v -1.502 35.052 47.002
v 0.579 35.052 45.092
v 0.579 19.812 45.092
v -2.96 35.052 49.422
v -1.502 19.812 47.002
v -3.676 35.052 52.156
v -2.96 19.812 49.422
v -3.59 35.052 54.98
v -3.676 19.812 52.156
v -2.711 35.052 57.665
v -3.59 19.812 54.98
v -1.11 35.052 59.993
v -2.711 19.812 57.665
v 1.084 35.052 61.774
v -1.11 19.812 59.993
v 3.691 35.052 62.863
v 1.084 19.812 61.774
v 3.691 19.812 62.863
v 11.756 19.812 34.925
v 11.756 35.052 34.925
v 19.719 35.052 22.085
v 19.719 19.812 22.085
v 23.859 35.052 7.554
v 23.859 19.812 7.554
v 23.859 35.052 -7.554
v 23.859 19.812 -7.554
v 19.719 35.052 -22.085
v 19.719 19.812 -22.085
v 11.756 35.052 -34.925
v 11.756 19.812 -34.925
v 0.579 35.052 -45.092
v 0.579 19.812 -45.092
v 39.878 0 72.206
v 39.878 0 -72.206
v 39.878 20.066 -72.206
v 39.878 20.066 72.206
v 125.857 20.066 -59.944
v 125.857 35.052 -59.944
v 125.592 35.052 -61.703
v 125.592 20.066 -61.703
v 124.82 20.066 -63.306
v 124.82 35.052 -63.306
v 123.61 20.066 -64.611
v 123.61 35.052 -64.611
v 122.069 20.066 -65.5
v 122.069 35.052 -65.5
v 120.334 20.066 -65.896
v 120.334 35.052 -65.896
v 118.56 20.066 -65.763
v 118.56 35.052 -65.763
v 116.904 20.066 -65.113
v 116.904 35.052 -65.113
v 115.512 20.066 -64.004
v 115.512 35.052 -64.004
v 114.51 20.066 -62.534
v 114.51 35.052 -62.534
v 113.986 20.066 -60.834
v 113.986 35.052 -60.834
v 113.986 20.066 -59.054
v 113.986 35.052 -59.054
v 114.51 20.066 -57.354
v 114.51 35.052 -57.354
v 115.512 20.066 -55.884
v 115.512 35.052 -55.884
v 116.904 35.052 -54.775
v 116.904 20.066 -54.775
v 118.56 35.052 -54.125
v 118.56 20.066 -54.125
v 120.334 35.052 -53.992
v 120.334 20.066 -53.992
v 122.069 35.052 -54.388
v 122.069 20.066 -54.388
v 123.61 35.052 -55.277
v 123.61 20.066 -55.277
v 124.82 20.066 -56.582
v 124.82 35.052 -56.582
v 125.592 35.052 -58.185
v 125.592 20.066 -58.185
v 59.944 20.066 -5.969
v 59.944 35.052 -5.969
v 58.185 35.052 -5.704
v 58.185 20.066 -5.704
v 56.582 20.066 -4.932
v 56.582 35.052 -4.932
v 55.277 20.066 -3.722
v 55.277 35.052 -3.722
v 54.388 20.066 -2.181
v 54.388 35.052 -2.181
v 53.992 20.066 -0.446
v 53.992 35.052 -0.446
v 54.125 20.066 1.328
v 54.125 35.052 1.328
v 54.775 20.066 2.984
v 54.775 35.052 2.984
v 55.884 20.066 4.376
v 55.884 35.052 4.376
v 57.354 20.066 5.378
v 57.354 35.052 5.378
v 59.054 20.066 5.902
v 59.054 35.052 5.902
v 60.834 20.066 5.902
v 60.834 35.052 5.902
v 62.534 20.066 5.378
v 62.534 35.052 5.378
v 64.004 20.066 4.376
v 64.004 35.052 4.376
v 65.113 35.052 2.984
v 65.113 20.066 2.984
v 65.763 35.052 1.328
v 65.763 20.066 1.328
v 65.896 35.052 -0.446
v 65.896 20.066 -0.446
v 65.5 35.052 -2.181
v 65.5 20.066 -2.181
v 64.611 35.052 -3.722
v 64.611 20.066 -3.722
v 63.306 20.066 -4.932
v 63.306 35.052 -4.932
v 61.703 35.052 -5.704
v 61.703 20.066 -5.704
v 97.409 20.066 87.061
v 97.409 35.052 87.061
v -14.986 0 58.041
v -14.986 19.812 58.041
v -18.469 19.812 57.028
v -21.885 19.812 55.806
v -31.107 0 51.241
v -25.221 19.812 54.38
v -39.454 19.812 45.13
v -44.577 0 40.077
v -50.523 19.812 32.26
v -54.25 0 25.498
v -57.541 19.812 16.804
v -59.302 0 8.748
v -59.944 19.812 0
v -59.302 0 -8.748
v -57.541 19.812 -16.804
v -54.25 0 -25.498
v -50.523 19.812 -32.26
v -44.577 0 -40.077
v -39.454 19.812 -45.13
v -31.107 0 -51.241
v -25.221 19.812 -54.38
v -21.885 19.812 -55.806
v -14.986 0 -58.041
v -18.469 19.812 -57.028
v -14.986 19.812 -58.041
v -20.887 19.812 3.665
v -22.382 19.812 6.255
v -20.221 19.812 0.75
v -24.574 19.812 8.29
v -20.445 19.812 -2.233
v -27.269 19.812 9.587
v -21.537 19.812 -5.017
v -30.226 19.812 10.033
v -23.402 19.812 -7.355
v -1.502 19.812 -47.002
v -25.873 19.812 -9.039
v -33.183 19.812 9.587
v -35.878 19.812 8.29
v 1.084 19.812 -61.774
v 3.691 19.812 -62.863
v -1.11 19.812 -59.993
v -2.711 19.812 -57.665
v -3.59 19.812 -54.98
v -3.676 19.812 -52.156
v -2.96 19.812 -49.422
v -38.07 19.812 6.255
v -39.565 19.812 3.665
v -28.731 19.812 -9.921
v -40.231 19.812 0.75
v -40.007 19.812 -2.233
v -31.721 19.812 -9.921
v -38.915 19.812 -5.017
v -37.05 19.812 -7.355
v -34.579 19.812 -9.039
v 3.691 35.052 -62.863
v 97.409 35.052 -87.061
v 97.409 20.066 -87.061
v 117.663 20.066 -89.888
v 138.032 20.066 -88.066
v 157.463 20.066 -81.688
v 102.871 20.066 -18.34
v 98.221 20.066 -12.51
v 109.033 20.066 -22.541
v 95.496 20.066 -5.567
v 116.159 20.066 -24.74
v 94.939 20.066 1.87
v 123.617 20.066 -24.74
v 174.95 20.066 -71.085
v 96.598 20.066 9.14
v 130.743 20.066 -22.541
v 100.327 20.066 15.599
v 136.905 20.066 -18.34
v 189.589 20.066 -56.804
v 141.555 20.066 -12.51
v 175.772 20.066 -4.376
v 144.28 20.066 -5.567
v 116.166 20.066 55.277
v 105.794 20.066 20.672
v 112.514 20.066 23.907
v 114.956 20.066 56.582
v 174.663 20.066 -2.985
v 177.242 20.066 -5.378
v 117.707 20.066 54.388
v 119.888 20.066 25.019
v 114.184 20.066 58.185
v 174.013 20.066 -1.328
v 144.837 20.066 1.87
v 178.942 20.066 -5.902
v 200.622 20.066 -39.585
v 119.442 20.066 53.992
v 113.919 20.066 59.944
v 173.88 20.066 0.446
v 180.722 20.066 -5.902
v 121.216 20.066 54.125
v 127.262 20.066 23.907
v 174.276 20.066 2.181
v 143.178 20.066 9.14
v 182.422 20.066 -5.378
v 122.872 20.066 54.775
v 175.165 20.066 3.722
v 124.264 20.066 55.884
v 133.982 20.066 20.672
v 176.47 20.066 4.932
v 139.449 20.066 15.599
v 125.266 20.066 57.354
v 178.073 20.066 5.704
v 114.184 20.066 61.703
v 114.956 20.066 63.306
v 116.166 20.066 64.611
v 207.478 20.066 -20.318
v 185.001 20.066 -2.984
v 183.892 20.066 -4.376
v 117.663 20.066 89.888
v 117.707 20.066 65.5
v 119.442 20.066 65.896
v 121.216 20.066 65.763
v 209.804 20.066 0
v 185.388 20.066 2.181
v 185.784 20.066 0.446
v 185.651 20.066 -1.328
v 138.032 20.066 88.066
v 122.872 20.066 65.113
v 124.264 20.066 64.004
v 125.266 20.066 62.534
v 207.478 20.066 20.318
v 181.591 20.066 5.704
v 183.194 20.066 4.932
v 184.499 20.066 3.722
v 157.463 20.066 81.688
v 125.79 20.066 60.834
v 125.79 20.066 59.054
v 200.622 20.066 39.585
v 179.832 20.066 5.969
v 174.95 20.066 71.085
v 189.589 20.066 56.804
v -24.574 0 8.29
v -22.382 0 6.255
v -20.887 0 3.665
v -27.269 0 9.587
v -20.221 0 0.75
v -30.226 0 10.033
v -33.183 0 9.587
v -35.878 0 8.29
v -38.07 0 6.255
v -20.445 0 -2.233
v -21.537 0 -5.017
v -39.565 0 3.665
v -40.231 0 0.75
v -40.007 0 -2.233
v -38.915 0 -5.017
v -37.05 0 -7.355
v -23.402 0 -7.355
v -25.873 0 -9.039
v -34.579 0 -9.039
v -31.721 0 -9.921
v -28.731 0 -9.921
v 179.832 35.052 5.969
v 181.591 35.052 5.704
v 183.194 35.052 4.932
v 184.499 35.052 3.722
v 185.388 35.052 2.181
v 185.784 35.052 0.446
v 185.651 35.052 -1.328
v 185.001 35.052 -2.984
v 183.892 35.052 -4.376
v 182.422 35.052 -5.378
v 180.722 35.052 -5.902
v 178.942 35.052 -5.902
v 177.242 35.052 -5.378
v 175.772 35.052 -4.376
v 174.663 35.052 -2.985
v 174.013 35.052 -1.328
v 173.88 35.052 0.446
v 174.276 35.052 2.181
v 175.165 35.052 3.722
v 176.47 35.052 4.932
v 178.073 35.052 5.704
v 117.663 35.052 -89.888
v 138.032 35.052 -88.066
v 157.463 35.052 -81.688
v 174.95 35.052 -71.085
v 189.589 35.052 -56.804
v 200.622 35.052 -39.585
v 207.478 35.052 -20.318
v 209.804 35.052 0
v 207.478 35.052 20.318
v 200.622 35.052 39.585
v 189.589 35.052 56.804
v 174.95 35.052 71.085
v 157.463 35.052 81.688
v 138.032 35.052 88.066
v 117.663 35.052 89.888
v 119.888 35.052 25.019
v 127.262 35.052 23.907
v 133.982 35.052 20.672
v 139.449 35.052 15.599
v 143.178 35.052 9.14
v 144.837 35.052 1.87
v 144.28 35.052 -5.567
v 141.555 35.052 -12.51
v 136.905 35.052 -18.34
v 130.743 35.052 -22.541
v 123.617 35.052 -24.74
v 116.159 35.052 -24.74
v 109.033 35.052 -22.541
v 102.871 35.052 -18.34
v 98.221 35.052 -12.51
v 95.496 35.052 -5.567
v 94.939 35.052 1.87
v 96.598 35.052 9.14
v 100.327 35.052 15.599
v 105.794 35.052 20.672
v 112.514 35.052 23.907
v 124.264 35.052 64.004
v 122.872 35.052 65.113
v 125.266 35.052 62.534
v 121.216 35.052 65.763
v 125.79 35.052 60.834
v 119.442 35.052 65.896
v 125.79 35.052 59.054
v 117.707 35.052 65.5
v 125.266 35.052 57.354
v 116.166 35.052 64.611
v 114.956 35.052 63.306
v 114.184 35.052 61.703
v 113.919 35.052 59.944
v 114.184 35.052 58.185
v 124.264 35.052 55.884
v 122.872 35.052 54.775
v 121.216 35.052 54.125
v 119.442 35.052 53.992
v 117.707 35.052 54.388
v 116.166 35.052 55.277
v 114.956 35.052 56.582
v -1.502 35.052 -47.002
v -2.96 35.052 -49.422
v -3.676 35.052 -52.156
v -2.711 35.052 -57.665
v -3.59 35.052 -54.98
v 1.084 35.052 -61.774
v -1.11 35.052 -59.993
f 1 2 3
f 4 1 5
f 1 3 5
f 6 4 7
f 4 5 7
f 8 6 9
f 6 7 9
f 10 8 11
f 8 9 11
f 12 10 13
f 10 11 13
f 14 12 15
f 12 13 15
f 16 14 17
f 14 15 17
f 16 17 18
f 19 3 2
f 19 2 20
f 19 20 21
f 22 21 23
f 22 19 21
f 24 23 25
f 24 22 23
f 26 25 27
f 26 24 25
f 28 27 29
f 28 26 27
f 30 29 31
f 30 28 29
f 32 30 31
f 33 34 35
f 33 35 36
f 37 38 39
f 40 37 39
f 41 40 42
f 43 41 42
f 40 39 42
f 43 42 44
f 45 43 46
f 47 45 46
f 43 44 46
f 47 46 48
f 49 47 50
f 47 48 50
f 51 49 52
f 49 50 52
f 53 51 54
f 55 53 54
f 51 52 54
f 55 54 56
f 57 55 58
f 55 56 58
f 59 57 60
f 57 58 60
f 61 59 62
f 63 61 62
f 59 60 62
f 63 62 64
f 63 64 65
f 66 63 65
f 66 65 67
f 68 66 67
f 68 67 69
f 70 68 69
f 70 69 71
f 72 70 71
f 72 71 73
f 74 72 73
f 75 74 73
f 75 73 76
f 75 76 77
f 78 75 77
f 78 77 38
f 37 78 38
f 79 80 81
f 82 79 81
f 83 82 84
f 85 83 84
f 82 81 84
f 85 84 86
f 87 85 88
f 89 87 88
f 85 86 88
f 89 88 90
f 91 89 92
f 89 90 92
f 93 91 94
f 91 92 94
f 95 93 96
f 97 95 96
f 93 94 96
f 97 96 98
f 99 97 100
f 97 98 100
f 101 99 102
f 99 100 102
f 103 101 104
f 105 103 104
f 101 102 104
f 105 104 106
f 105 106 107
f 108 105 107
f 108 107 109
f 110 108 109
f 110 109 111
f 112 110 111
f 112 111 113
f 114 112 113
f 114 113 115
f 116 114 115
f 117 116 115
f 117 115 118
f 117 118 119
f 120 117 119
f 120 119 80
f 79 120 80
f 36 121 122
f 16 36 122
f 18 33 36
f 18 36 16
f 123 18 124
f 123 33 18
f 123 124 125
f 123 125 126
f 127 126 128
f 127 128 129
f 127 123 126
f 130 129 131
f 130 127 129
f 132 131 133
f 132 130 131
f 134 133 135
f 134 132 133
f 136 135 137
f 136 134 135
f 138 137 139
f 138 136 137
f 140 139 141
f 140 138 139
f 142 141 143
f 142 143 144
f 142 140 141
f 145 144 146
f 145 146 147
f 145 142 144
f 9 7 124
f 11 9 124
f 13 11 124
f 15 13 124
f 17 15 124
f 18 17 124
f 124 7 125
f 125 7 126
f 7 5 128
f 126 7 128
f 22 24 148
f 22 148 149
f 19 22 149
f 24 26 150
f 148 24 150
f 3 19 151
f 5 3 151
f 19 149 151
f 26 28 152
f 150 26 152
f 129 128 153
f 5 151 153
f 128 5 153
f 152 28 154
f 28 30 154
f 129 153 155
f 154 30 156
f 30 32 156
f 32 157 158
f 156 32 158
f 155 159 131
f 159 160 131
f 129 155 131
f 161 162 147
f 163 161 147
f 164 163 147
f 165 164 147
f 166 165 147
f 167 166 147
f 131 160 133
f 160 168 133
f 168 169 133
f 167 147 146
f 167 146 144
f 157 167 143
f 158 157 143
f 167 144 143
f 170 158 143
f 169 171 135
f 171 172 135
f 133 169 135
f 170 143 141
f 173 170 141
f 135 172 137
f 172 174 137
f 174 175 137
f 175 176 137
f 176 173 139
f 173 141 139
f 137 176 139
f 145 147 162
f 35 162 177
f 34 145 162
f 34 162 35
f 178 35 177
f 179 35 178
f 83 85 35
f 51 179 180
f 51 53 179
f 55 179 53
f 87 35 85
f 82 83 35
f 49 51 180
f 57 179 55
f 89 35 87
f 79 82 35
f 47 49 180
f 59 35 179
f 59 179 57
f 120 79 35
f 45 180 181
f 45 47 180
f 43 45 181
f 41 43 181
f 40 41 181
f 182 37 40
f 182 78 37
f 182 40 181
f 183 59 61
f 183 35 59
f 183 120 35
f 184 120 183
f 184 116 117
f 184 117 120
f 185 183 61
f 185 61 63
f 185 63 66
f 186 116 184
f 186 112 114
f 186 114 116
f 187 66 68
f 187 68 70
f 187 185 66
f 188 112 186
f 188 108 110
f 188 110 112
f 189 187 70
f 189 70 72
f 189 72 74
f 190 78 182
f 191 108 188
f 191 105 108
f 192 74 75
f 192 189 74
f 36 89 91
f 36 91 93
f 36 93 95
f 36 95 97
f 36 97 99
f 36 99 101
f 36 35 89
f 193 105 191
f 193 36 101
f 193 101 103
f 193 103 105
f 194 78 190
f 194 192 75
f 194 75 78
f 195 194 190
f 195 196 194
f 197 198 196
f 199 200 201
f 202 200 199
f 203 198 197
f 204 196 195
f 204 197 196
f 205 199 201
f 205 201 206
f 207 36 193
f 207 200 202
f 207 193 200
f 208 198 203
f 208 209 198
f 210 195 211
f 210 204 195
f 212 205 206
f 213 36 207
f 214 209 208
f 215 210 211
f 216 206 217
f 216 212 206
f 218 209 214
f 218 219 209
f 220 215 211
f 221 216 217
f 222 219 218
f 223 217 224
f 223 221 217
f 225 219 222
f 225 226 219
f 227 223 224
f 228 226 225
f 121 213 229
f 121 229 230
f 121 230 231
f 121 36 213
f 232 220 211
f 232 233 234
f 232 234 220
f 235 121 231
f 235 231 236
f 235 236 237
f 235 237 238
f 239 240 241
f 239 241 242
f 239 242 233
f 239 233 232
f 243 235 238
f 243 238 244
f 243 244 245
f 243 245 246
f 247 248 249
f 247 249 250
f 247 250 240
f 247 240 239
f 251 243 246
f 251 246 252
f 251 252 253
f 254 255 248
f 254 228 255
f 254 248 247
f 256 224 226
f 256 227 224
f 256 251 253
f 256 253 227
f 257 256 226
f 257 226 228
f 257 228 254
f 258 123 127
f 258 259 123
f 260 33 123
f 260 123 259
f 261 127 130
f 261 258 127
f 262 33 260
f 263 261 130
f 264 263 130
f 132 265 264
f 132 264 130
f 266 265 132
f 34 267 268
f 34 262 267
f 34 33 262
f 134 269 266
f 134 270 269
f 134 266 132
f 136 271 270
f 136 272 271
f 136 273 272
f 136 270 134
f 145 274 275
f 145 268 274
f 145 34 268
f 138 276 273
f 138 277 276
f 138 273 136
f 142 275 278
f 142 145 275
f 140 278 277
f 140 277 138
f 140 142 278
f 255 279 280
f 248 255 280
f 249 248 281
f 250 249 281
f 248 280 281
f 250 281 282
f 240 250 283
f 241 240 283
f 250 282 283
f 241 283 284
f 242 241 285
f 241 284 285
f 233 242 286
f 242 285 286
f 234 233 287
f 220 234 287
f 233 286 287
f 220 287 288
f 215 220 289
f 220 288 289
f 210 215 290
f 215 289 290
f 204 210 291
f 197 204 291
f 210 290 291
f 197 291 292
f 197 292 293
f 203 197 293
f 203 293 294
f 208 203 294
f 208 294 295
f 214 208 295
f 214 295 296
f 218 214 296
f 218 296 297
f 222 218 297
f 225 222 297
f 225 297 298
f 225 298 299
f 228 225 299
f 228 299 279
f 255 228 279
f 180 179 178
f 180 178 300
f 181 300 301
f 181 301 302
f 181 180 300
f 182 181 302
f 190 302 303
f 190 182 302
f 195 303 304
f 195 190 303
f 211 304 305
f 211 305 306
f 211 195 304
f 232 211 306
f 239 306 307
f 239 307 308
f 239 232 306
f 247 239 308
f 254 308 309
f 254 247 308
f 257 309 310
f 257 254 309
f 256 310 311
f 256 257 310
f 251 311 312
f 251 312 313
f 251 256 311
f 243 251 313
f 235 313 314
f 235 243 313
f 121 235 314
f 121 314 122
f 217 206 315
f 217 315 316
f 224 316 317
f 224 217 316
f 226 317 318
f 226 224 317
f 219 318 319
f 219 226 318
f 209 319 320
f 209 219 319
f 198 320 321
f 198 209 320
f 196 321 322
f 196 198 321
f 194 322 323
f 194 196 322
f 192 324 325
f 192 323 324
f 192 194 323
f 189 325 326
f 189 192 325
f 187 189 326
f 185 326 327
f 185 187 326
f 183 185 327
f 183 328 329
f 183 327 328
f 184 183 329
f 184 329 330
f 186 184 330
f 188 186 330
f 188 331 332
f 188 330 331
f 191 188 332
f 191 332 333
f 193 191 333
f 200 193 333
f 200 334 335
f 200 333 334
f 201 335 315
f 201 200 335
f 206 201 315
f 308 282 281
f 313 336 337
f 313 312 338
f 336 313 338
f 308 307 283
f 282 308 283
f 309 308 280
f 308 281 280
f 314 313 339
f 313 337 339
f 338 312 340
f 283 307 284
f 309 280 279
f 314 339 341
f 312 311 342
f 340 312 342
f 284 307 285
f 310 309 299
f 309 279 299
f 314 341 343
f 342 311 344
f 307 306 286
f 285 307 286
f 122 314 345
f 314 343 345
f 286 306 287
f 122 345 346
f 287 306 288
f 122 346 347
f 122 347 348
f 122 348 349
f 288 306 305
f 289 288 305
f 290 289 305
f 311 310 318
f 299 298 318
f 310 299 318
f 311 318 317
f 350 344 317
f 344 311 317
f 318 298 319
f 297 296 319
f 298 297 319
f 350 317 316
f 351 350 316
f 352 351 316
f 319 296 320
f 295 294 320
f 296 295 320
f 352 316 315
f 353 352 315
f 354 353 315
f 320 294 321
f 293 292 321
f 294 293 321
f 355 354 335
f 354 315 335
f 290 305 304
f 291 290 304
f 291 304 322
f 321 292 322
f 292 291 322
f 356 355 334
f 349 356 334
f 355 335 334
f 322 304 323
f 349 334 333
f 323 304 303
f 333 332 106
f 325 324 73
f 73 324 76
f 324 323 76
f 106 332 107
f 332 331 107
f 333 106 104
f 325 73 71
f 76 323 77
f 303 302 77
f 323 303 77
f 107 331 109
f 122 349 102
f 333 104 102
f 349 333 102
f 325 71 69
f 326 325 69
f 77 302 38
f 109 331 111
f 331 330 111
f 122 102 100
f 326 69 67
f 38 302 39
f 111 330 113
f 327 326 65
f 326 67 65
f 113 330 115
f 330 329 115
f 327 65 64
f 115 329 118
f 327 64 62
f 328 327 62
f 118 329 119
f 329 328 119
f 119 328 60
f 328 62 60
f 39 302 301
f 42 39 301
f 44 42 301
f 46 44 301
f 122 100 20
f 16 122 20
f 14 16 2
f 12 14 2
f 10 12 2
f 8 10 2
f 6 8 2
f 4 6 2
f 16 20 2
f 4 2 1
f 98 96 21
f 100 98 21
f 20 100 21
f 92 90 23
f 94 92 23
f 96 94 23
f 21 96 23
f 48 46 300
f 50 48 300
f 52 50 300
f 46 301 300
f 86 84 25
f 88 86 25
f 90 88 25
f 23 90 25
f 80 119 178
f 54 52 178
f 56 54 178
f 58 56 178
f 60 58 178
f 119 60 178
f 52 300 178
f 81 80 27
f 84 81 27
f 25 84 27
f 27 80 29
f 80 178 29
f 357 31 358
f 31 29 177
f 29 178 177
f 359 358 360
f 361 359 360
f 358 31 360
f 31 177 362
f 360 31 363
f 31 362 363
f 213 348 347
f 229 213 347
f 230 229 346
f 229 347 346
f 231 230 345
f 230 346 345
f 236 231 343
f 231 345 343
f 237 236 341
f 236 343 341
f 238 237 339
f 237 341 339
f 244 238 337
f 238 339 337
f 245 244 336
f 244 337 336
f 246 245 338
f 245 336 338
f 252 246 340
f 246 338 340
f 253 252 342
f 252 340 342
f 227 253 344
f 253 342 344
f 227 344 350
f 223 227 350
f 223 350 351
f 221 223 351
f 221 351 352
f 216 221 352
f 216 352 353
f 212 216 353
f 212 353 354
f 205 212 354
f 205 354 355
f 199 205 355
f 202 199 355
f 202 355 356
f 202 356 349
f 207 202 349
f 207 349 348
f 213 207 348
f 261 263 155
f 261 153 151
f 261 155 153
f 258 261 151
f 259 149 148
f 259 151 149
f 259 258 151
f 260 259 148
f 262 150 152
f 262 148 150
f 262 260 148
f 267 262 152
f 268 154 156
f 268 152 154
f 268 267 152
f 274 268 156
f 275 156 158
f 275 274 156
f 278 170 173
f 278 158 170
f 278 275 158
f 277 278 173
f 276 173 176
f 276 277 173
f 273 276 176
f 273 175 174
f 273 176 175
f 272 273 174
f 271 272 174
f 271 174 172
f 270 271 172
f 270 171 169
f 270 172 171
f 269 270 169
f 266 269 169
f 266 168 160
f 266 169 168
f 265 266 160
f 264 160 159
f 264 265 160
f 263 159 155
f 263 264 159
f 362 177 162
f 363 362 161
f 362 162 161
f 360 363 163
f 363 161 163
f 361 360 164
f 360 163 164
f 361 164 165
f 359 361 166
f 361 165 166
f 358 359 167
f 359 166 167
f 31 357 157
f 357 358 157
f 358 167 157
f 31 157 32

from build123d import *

# Parameters (mm, degrees)
BOSS_EXTRUDE1_DEPTH     = 35.052
CUT_EXTRUDE1_DEPTH      = 231.935593134
CUT_EXTRUDE1_DEPTH_BACK = 231.935593134
SKETCH2_R               = 25.019
SKETCH2_R_2             = 10.033
CUT_EXTRUDE2_START      = -15.24
CUT_EXTRUDE2_DEPTH      = 15.24
FILLET1_R               = 9.906
SKETCH5_R               = 5.969
CUT_EXTRUDE3_DEPTH      = 231.935593134
CIRPATTERN1_COUNT       = 4
SKETCH6_W               = 250.475884559
SKETCH6_H               = 232.654927102
CUT_EXTRUDE4_DEPTH      = 20.066


with BuildPart() as part:
    # Sketch1 → Boss-Extrude1 (new body)
    with BuildSketch(Plane(origin=(0, 0, 0), x_dir=(1, 0, 0), z_dir=(0, 1, 0))):
        with BuildLine():
            Line((-14.986, 58.040528426), (97.409, 87.060792639))
            ThreePointArc((97.409, 87.060792639), (209.804, 0), (97.409, -87.060792639))
            Line((97.409, -87.060792639), (-14.986, -58.040528426))
            ThreePointArc((-14.986, -58.040528426), (-59.944, 0), (-14.986, 58.040528426))
        make_face()
    extrude(amount=BOSS_EXTRUDE1_DEPTH)

    # Sketch2 → Cut-Extrude1 (cut, two sides: drawn at the far end of the back side and taken through both)
    with BuildSketch(Plane(origin=(0, 35.052, 0), x_dir=(1, 0, 0), z_dir=(0, 1, 0)).offset(-CUT_EXTRUDE1_DEPTH_BACK)):
        with Locations(Location((119.888, 0, 0), (0, 0, 270))):
            Circle(SKETCH2_R)
        with Locations(Location((-30.226, 0, 0), (0, 0, 270))):
            Circle(SKETCH2_R_2)
    extrude(amount=CUT_EXTRUDE1_DEPTH + CUT_EXTRUDE1_DEPTH_BACK, mode=Mode.SUBTRACT)

    # Sketch3 → Cut-Extrude2 (cut)
    with BuildSketch(Plane(origin=(0, 35.052, 0), x_dir=(1, 0, 0), z_dir=(0, 1, 0)).offset(CUT_EXTRUDE2_START)):
        with BuildLine():
            ThreePointArc((-25.220705882, 54.380135443), (-59.944, 0), (-25.220705882, -54.380135443))
            ThreePointArc((-25.220705882, -54.380135443), (24.384, 0), (-25.220705882, 54.380135443))
        make_face()
    extrude(amount=CUT_EXTRUDE2_DEPTH, mode=Mode.SUBTRACT)

    # Fillet1
    # the kernel refuses this fillet: 9.906 mm, written as the material it takes off along each edge
    with BuildSketch(Plane(origin=(-25.220705882, 19.812, -54.380135443), x_dir=(0.9595509242122834, 0, -0.28153512008868975), z_dir=(0, 1, 0))) as fillet1_piece_1:
        with BuildLine():
            CenterArc((29.806229626, -9.900699967), FILLET1_R, 88.125665331, 131.182876807)
            Line((22.141504015, -16.176113683), (21.375031454, -16.803655054))
            ThreePointArc((21.375031454, -16.803655054), (11.518208373, -7.475588537), (-0.364835977, -0.92096855))
            Line((-0.364835977, -0.92096855), (-0.146921489, 0.979644035))
            ThreePointArc((-0.146921489, 0.979644035), (10.883650693, 1.620974317), (30.162629918, 0.990069997))
            Line((30.162629918, 0.990069997), (30.130229891, 0))
        make_face()
    extrude(amount=90.565574728, mode=Mode.SUBTRACT)
    with BuildSketch(Plane(origin=(-25.220705882, 19.812, 54.380135443), x_dir=(0.9595509242122835, 0, 0.2815351200886891), z_dir=(0, 1, 0))) as fillet1_piece_2:
        with BuildLine():
            CenterArc((29.806229626, 9.900699967), FILLET1_R, 140.691457861, 131.182876807)
            Line((22.141504015, 16.176113683), (21.375031454, 16.803655054))
            ThreePointArc((21.375031454, 16.803655054), (11.518208373, 7.475588537), (-0.364835977, 0.92096855))
            Line((-0.364835977, 0.92096855), (-0.146921489, -0.979644035))
            ThreePointArc((-0.146921489, -0.979644035), (10.883650693, -1.620974317), (30.162629918, -0.990069997))
            Line((30.162629918, -0.990069997), (30.130229891, 0))
        make_face()
    extrude(amount=90.565574728, mode=Mode.SUBTRACT)

    # Sketch5 → Cut-Extrude3 (cut, through all)
    with BuildSketch(Plane(origin=(0, 35.052, 0), x_dir=(1, 0, 0), z_dir=(0, 1, 0))):
        with Locations(Location((179.832, 0, 0), (0, 0, 270))):
            Circle(SKETCH5_R)
    cut_extrude3 = extrude(amount=-CUT_EXTRUDE3_DEPTH, mode=Mode.SUBTRACT)

    # CirPattern1: Cut-Extrude3 ×4 about axis
    cirpattern1_axis = Axis((119.888, 0, 0), (0, 1, 0))
    for i in range(1, CIRPATTERN1_COUNT):
        add(cut_extrude3.rotate(cirpattern1_axis, i * 360 / CIRPATTERN1_COUNT), mode=Mode.SUBTRACT)

    # Sketch6 → Cut-Extrude4 (cut)
    with BuildSketch(Plane.XZ):
        with Locations((165.115942279, 0)):
            Rectangle(SKETCH6_W, SKETCH6_H)
    extrude(amount=-CUT_EXTRUDE4_DEPTH, mode=Mode.SUBTRACT)


solid = part.part
